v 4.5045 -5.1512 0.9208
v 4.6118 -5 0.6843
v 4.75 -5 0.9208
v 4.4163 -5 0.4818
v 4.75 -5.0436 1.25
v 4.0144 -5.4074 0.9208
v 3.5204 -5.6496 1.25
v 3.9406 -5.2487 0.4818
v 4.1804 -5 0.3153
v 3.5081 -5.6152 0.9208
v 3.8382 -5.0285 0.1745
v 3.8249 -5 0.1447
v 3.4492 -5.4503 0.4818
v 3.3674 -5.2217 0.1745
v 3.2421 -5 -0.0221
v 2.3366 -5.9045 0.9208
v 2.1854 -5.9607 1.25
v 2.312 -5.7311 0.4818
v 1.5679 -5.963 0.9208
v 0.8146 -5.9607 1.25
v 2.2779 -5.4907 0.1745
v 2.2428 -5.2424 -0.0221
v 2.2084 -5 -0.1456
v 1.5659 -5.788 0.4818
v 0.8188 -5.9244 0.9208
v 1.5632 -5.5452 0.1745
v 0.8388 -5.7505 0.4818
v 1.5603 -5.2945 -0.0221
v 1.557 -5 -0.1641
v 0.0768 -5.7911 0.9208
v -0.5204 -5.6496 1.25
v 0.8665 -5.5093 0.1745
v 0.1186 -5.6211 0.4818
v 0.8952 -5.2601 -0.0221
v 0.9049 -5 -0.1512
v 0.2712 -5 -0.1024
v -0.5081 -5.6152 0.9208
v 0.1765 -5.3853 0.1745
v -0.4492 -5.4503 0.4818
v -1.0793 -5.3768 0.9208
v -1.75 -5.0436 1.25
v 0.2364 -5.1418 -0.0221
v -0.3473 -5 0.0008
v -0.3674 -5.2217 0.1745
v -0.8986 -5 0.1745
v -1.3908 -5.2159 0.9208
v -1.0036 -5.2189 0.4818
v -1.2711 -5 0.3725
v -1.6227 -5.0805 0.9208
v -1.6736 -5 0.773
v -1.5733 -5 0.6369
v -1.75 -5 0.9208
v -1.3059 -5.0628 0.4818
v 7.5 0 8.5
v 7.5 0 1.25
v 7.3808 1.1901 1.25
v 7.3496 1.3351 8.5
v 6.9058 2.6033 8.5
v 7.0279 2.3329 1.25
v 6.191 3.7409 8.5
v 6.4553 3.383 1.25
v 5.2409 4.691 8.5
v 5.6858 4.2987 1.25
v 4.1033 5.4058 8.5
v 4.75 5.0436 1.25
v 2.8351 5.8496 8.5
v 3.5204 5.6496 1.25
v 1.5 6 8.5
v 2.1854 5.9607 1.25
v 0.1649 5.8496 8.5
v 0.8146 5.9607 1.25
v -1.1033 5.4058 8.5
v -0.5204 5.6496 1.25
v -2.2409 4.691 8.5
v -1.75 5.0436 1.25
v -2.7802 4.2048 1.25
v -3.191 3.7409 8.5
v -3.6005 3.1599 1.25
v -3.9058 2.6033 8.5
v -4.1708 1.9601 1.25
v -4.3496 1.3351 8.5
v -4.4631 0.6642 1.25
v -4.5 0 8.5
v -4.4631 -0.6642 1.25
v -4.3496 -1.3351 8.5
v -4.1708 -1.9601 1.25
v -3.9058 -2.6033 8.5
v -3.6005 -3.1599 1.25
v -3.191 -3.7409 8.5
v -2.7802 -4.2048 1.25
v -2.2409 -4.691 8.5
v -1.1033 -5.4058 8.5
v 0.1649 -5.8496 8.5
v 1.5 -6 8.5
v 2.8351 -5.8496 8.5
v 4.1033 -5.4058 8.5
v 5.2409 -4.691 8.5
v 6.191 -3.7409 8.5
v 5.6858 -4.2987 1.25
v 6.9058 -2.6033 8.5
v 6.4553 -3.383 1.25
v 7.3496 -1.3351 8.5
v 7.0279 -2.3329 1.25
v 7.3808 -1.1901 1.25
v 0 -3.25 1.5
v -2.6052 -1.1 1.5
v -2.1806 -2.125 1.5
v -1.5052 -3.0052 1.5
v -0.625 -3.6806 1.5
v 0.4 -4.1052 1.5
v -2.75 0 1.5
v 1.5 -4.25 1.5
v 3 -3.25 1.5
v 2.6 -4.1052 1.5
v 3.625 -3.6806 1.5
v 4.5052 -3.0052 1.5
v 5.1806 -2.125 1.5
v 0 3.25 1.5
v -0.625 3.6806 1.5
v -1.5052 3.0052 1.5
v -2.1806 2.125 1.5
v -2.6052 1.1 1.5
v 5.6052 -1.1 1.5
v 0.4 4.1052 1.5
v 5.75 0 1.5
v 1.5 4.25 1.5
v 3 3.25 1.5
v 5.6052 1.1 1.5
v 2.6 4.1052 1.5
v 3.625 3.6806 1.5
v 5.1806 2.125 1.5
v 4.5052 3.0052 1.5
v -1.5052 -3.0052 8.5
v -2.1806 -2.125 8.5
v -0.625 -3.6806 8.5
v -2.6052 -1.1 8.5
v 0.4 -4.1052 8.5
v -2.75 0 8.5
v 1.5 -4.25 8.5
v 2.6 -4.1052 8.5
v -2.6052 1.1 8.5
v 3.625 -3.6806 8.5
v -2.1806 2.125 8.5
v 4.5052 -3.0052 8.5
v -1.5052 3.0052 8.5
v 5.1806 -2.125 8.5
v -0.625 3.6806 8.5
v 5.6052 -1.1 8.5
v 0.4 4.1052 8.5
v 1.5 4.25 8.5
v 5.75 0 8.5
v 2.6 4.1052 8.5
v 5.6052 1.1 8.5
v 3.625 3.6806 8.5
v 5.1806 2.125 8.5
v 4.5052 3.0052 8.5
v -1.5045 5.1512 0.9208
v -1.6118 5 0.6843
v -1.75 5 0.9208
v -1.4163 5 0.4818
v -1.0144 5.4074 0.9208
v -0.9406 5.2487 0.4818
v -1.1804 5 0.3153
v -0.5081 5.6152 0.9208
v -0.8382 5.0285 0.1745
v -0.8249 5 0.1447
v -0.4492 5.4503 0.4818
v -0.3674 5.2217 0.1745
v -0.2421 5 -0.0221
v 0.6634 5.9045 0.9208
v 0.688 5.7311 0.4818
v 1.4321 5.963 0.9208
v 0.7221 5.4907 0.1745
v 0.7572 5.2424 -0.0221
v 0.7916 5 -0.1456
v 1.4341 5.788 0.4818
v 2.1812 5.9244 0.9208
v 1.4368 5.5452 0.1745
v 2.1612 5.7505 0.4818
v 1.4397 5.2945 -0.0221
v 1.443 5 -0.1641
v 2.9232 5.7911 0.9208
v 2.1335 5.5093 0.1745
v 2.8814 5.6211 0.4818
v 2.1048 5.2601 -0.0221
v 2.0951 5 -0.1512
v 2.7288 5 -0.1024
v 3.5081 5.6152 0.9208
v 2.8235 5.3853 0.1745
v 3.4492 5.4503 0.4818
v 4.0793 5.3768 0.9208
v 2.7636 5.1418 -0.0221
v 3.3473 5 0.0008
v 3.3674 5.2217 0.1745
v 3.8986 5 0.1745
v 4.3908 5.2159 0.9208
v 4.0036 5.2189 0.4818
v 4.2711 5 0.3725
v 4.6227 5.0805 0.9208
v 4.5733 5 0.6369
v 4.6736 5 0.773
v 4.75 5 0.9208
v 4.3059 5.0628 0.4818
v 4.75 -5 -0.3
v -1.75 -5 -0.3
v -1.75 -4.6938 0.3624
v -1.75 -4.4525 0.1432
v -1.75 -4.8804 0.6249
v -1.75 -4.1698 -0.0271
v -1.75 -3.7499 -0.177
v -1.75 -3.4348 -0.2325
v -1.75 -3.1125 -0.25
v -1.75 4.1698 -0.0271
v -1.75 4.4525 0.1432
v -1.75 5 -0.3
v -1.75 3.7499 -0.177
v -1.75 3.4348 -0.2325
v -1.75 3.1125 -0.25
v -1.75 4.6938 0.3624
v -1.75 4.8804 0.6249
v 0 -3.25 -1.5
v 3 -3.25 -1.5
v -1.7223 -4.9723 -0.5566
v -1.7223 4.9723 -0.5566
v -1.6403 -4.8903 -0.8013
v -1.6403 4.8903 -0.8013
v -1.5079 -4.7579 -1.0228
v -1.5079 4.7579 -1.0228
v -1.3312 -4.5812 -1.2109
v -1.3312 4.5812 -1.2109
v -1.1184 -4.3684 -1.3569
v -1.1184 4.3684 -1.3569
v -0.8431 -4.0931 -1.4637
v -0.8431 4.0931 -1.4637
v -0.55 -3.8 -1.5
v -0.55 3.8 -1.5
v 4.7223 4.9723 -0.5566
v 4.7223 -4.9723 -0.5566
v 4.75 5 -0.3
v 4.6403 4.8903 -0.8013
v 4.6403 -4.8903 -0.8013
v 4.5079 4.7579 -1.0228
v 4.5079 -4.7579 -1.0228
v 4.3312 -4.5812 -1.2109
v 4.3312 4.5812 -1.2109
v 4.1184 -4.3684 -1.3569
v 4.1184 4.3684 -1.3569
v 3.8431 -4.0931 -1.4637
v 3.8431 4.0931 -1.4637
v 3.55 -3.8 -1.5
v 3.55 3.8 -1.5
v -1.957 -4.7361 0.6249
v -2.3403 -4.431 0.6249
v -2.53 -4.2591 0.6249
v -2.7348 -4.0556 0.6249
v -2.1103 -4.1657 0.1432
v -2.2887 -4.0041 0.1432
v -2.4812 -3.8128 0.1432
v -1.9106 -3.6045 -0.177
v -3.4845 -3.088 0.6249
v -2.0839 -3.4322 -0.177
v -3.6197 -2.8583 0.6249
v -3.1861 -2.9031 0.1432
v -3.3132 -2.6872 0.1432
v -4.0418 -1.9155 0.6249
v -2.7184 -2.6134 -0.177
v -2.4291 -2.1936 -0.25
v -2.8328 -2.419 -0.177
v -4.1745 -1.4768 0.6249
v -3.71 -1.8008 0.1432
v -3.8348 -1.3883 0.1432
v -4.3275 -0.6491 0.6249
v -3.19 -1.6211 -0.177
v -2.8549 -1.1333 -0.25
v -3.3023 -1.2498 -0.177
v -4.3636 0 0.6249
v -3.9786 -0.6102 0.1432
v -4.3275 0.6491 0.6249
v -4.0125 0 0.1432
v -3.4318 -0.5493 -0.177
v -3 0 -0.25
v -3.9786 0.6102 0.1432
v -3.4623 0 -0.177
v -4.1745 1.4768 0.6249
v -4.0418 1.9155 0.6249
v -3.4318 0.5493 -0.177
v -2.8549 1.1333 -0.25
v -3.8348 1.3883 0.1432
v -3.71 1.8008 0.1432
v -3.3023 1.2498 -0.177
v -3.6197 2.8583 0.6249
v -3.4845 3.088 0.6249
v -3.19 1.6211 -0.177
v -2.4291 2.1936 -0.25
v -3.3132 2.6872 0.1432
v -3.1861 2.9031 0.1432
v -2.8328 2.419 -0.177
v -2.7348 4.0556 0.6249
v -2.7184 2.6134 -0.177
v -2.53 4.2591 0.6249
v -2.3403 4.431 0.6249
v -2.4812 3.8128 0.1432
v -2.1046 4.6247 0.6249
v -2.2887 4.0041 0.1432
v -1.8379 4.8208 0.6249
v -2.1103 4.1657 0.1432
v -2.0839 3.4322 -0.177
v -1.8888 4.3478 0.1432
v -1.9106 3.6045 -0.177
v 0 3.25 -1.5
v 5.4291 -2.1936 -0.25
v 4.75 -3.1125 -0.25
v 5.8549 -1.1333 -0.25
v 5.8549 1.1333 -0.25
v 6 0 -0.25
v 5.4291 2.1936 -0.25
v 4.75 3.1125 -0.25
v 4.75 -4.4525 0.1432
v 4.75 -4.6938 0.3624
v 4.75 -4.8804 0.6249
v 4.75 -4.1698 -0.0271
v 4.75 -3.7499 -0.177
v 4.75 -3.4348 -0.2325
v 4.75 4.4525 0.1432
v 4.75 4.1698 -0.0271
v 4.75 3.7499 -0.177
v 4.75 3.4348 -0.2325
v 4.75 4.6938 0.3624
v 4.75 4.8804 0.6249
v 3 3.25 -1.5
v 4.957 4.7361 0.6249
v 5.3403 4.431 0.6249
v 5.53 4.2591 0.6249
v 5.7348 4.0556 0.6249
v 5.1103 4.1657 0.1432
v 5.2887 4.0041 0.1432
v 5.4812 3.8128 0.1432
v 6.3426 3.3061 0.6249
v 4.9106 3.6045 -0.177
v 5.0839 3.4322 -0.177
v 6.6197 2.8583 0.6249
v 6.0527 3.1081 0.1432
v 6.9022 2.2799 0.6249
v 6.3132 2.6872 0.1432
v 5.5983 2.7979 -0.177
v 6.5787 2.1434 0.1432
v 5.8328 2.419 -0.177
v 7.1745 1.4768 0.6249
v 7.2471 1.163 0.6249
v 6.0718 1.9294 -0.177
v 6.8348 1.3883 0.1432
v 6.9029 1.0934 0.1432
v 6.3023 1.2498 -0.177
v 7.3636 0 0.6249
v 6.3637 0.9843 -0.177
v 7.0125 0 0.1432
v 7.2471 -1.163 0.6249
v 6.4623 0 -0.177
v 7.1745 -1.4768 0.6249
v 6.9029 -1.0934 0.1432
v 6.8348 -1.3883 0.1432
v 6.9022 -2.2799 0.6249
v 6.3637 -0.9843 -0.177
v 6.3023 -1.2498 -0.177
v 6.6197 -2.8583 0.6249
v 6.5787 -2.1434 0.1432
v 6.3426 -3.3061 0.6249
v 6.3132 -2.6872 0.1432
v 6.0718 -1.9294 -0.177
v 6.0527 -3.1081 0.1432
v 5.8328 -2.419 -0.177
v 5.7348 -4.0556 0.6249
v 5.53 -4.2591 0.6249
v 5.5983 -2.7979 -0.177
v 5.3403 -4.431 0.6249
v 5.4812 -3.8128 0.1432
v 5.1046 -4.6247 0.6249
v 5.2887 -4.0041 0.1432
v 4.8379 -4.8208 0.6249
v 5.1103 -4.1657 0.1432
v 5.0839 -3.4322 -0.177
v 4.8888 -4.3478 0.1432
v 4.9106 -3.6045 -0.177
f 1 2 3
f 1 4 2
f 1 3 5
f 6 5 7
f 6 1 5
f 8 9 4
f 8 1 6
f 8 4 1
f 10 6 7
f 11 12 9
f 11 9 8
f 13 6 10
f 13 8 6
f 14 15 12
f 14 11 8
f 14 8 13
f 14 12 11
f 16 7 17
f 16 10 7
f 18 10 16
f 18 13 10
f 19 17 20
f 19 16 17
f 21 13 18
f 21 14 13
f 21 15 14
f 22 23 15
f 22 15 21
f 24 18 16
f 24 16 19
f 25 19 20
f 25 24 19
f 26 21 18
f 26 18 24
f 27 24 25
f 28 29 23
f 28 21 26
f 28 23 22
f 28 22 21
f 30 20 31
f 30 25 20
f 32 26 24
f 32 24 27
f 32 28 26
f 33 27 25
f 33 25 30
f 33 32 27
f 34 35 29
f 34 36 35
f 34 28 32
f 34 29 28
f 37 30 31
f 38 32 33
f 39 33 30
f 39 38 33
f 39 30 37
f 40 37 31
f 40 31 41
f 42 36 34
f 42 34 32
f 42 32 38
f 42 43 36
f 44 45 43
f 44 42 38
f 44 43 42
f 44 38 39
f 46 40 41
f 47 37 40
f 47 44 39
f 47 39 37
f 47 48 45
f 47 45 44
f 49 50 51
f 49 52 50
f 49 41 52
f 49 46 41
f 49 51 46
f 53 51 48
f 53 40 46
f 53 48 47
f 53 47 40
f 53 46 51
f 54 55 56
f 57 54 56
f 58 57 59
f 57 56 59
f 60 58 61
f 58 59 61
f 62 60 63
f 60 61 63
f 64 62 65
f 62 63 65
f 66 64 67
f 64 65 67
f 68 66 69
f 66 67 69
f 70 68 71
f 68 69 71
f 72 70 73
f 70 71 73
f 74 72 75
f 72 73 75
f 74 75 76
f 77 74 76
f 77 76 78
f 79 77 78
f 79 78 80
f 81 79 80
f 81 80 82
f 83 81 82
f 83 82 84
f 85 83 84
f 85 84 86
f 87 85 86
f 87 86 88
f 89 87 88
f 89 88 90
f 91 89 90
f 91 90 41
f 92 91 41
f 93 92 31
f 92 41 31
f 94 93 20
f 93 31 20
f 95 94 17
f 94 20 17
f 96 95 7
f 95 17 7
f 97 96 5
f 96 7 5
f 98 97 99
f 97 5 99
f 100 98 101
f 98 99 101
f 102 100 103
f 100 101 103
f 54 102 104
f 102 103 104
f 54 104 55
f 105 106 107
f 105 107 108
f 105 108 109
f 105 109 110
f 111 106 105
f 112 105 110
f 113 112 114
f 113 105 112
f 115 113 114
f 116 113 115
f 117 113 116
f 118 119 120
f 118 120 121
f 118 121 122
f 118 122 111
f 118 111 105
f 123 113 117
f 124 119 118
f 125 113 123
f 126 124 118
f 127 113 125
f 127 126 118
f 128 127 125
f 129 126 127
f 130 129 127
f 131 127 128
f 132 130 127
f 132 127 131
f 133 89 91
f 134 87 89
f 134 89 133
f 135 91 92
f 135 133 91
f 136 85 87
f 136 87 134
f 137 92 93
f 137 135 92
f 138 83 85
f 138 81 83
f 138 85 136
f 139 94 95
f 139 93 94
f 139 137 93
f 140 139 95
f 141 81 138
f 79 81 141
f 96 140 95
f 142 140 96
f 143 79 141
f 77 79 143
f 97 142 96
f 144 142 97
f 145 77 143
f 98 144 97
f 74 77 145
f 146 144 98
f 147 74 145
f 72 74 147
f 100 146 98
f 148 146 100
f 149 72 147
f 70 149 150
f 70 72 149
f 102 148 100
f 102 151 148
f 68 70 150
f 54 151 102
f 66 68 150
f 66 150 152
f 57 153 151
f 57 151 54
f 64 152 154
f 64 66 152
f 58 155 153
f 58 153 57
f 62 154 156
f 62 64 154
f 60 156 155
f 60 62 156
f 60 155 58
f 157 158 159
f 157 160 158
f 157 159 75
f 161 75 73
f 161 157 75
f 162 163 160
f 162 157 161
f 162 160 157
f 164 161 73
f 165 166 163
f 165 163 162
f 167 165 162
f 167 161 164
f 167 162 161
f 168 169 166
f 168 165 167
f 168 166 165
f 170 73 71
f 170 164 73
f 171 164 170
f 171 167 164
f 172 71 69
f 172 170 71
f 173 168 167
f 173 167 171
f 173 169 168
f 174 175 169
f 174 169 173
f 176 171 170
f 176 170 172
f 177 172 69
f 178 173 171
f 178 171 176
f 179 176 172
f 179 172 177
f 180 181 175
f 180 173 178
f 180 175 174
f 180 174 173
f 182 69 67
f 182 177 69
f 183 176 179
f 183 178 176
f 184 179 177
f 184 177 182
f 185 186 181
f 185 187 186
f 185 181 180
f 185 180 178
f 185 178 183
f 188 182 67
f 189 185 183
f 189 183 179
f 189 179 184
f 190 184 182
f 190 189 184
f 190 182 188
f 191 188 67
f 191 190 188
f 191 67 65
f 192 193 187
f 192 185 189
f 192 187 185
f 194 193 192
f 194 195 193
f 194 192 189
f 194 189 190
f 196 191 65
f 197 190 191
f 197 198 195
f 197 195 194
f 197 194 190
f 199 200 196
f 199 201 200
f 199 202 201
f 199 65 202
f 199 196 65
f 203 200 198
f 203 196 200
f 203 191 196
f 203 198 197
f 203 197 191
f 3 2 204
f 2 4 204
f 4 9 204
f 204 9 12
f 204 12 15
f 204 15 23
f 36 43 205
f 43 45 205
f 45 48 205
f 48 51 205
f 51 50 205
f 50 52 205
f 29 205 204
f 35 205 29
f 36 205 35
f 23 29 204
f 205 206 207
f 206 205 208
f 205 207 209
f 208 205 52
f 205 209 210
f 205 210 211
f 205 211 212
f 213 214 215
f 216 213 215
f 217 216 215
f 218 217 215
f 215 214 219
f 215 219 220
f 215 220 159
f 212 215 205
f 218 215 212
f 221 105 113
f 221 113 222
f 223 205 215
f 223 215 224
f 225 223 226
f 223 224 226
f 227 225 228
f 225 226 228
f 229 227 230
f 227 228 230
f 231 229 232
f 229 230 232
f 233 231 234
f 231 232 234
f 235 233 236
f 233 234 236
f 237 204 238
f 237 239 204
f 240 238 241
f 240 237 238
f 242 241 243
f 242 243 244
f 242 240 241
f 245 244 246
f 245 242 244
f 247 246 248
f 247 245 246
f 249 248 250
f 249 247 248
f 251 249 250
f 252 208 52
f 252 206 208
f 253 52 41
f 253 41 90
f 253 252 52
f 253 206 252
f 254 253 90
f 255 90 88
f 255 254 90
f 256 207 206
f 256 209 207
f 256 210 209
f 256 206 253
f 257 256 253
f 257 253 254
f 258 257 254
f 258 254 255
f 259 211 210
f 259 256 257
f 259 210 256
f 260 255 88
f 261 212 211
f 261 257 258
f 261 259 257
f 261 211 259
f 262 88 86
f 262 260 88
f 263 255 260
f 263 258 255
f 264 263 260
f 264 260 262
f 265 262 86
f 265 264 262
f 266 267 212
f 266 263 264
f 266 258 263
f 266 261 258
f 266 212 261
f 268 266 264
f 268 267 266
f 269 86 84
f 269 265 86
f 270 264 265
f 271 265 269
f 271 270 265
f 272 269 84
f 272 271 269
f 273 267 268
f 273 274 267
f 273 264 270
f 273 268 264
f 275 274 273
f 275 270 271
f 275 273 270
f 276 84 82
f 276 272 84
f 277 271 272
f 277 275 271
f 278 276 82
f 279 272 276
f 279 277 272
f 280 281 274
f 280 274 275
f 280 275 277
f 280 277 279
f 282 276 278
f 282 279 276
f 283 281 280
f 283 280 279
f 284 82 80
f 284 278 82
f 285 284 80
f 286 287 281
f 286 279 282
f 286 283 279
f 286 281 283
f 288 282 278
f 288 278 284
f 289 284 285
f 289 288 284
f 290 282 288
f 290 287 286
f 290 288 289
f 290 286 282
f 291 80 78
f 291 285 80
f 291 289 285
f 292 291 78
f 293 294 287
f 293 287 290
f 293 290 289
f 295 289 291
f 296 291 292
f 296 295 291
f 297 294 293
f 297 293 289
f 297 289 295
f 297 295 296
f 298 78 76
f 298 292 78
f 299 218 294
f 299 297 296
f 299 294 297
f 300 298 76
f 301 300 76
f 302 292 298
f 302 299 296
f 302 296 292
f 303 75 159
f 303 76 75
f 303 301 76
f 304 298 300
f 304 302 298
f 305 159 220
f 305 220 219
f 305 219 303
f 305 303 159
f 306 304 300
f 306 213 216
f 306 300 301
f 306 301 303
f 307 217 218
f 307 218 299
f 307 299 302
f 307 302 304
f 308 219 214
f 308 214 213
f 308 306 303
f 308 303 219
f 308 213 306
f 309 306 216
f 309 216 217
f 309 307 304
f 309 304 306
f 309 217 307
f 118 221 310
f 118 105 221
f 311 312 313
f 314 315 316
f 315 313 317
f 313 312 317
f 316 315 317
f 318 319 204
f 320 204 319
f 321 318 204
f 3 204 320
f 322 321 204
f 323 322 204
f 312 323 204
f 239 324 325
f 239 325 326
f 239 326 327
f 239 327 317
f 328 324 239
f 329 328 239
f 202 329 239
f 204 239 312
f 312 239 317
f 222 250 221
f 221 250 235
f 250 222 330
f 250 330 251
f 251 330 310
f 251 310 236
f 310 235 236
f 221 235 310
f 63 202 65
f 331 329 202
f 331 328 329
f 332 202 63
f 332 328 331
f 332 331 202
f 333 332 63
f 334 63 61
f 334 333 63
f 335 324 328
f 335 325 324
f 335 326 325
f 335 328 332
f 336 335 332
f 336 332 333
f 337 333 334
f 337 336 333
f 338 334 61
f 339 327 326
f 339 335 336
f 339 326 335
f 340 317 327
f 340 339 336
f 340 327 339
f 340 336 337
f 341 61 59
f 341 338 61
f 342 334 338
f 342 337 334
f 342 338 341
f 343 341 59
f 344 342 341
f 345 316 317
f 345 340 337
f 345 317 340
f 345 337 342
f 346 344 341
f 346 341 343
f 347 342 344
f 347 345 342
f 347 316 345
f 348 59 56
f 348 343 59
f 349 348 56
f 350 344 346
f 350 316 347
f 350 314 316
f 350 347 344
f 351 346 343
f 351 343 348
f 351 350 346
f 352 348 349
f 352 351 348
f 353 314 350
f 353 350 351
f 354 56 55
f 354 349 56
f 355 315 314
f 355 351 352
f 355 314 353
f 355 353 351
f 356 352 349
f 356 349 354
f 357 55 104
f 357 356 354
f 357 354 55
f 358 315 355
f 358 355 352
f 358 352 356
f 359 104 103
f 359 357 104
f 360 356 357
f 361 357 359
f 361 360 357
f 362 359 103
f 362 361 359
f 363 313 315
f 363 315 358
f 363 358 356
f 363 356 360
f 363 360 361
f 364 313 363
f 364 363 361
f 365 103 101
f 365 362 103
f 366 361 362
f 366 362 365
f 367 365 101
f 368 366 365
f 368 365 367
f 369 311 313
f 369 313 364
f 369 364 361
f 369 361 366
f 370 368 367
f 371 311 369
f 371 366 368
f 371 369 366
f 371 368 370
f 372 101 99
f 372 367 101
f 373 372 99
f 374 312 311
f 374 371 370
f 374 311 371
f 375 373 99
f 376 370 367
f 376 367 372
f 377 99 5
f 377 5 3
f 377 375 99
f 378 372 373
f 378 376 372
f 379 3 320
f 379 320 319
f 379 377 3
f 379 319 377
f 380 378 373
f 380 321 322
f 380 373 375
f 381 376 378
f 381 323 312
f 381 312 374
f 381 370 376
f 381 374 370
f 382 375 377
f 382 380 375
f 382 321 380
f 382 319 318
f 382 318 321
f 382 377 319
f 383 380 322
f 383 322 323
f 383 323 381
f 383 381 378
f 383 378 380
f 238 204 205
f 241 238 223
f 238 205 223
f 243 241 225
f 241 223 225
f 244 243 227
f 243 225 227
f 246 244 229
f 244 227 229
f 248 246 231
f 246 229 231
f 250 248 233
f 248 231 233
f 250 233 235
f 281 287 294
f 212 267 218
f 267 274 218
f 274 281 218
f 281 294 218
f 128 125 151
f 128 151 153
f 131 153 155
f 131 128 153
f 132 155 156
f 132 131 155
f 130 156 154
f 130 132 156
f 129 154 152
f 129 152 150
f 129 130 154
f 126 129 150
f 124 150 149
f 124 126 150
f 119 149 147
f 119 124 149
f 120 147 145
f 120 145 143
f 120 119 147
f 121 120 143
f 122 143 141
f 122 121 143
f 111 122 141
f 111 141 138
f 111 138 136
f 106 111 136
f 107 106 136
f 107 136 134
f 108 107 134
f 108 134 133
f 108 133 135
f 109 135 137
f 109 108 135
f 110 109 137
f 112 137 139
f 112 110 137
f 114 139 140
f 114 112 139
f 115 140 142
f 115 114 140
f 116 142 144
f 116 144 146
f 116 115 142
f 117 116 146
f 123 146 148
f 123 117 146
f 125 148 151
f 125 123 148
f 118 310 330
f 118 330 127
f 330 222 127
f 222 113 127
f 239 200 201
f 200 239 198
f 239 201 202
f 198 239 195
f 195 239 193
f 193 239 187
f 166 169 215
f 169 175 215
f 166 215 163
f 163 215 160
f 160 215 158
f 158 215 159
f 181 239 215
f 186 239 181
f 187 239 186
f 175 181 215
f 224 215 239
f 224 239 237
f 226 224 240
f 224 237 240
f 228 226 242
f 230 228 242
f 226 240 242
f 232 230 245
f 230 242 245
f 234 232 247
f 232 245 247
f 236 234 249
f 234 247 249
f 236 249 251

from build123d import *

# Parameters (mm, degrees)
F1_DEPTH = 3
F2_R     = 4.25
F3_DEPTH = 7
F4_T     = 1.75
F6_R     = 1.2


# Not quite as in the source:
# - a fillet or chamfer that OpenCascade refuses, or shapes differently, is made with other operations: its cross-section is extruded or revolved along the edge and cut away or added


with BuildPart() as f1:
    # F0 (on Right) → F1 (new body)
    with BuildSketch(Plane.YZ):
        Polygon((-3.25, -1.5), (3.25, -1.5), (3.25, 1.5), (0, 1.5), (-3.25, 1.5), align=None)
    extrude(amount=F1_DEPTH)

    # F2 (on face) → F3 (join)
    with BuildSketch(Plane.XY.offset(1.5)):
        with Locations((1.5, 0)):
            Circle(F2_R)
    extrude(amount=F3_DEPTH)

    # F4
    f4_openings = [f1.faces().sort_by_distance(p)[0] for p in [
        (1.5, 0, -1.5),
        (1.5, 0, 8.5),
    ]]
    offset(amount=F4_T, openings=f4_openings, kind=Kind.INTERSECTION)

    # F5: fillet of radius 1.5 on 1 edges, made by hand


with BuildPart() as f5_tool2:
    # F5_s3 → F5_t4 (revolve)
    with BuildSketch(Plane.XZ):
        with BuildLine():
            ThreePointArc((7.5, 1.25), (7.0606601718, 0.1893398282), (6, -0.25))
            Line((6, -0.25), (7.5, -0.25))
            Line((7.5, -0.25), (7.5, 1.25))
        make_face()
    revolve(axis=Axis((1.5, 0, -0.25), (0, 0, -1)))

    split(bisect_by=Plane.YZ.offset(4.75), keep=Keep.TOP)


with BuildPart() as f1_1:
    add(f1.part)

    # F5_t1: cut F5_tool2
    add(f5_tool2.part, mode=Mode.SUBTRACT)


with BuildPart() as f5_tool7:
    # F5_s8 → F5_t9 (revolve)
    with BuildSketch(Plane.XZ):
        with BuildLine():
            ThreePointArc((7.5, 1.25), (7.0606601718, 0.1893398282), (6, -0.25))
            Line((6, -0.25), (7.5, -0.25))
            Line((7.5, -0.25), (7.5, 1.25))
        make_face()
    revolve(axis=Axis((1.5, 0, -0.25), (0, 0, -1)))

    split(bisect_by=Plane.YZ.offset(-1.75), keep=Keep.BOTTOM)


with BuildPart() as f1_2:
    add(f1_1.part)

    # F5_t6: cut F5_tool7
    add(f5_tool7.part, mode=Mode.SUBTRACT)


with BuildPart() as f5_tool12:
    # F5_s13 → F5_t14 (revolve)
    with BuildSketch(Plane.XZ):
        with BuildLine():
            ThreePointArc((7.5, 1.25), (7.0606601718, 0.1893398282), (6, -0.25))
            Line((6, -0.25), (7.5, -0.25))
            Line((7.5, -0.25), (7.5, 1.25))
        make_face()
    revolve(axis=Axis((1.5, 0, -0.25), (0, 0, -1)))

    split(bisect_by=Plane.XZ.offset(5), keep=Keep.TOP)


with BuildPart() as f1_3:
    add(f1_2.part)

    # F5_t11: cut F5_tool12
    add(f5_tool12.part, mode=Mode.SUBTRACT)


with BuildPart() as f5_tool17:
    # F5_s18 → F5_t19 (revolve)
    with BuildSketch(Plane.XZ):
        with BuildLine():
            ThreePointArc((7.5, 1.25), (7.0606601718, 0.1893398282), (6, -0.25))
            Line((6, -0.25), (7.5, -0.25))
            Line((7.5, -0.25), (7.5, 1.25))
        make_face()
    revolve(axis=Axis((1.5, 0, -0.25), (0, 0, -1)))

    split(bisect_by=Plane.XZ.offset(-5), keep=Keep.BOTTOM)


with BuildPart() as f1_4:
    add(f1_3.part)

    # F5_t16: cut F5_tool17
    add(f5_tool17.part, mode=Mode.SUBTRACT)

    # F6
    f6_edges = [f1_4.edges().sort_by_distance(p)[0] for p in [
        (1.5, 5, -1.5),
        (4.75, 0, -1.5),
        (1.5, -5, -1.5),
        (-1.75, 0, -1.5),
    ]]
    fillet(f6_edges, radius=F6_R)


solid = f1_4.part
